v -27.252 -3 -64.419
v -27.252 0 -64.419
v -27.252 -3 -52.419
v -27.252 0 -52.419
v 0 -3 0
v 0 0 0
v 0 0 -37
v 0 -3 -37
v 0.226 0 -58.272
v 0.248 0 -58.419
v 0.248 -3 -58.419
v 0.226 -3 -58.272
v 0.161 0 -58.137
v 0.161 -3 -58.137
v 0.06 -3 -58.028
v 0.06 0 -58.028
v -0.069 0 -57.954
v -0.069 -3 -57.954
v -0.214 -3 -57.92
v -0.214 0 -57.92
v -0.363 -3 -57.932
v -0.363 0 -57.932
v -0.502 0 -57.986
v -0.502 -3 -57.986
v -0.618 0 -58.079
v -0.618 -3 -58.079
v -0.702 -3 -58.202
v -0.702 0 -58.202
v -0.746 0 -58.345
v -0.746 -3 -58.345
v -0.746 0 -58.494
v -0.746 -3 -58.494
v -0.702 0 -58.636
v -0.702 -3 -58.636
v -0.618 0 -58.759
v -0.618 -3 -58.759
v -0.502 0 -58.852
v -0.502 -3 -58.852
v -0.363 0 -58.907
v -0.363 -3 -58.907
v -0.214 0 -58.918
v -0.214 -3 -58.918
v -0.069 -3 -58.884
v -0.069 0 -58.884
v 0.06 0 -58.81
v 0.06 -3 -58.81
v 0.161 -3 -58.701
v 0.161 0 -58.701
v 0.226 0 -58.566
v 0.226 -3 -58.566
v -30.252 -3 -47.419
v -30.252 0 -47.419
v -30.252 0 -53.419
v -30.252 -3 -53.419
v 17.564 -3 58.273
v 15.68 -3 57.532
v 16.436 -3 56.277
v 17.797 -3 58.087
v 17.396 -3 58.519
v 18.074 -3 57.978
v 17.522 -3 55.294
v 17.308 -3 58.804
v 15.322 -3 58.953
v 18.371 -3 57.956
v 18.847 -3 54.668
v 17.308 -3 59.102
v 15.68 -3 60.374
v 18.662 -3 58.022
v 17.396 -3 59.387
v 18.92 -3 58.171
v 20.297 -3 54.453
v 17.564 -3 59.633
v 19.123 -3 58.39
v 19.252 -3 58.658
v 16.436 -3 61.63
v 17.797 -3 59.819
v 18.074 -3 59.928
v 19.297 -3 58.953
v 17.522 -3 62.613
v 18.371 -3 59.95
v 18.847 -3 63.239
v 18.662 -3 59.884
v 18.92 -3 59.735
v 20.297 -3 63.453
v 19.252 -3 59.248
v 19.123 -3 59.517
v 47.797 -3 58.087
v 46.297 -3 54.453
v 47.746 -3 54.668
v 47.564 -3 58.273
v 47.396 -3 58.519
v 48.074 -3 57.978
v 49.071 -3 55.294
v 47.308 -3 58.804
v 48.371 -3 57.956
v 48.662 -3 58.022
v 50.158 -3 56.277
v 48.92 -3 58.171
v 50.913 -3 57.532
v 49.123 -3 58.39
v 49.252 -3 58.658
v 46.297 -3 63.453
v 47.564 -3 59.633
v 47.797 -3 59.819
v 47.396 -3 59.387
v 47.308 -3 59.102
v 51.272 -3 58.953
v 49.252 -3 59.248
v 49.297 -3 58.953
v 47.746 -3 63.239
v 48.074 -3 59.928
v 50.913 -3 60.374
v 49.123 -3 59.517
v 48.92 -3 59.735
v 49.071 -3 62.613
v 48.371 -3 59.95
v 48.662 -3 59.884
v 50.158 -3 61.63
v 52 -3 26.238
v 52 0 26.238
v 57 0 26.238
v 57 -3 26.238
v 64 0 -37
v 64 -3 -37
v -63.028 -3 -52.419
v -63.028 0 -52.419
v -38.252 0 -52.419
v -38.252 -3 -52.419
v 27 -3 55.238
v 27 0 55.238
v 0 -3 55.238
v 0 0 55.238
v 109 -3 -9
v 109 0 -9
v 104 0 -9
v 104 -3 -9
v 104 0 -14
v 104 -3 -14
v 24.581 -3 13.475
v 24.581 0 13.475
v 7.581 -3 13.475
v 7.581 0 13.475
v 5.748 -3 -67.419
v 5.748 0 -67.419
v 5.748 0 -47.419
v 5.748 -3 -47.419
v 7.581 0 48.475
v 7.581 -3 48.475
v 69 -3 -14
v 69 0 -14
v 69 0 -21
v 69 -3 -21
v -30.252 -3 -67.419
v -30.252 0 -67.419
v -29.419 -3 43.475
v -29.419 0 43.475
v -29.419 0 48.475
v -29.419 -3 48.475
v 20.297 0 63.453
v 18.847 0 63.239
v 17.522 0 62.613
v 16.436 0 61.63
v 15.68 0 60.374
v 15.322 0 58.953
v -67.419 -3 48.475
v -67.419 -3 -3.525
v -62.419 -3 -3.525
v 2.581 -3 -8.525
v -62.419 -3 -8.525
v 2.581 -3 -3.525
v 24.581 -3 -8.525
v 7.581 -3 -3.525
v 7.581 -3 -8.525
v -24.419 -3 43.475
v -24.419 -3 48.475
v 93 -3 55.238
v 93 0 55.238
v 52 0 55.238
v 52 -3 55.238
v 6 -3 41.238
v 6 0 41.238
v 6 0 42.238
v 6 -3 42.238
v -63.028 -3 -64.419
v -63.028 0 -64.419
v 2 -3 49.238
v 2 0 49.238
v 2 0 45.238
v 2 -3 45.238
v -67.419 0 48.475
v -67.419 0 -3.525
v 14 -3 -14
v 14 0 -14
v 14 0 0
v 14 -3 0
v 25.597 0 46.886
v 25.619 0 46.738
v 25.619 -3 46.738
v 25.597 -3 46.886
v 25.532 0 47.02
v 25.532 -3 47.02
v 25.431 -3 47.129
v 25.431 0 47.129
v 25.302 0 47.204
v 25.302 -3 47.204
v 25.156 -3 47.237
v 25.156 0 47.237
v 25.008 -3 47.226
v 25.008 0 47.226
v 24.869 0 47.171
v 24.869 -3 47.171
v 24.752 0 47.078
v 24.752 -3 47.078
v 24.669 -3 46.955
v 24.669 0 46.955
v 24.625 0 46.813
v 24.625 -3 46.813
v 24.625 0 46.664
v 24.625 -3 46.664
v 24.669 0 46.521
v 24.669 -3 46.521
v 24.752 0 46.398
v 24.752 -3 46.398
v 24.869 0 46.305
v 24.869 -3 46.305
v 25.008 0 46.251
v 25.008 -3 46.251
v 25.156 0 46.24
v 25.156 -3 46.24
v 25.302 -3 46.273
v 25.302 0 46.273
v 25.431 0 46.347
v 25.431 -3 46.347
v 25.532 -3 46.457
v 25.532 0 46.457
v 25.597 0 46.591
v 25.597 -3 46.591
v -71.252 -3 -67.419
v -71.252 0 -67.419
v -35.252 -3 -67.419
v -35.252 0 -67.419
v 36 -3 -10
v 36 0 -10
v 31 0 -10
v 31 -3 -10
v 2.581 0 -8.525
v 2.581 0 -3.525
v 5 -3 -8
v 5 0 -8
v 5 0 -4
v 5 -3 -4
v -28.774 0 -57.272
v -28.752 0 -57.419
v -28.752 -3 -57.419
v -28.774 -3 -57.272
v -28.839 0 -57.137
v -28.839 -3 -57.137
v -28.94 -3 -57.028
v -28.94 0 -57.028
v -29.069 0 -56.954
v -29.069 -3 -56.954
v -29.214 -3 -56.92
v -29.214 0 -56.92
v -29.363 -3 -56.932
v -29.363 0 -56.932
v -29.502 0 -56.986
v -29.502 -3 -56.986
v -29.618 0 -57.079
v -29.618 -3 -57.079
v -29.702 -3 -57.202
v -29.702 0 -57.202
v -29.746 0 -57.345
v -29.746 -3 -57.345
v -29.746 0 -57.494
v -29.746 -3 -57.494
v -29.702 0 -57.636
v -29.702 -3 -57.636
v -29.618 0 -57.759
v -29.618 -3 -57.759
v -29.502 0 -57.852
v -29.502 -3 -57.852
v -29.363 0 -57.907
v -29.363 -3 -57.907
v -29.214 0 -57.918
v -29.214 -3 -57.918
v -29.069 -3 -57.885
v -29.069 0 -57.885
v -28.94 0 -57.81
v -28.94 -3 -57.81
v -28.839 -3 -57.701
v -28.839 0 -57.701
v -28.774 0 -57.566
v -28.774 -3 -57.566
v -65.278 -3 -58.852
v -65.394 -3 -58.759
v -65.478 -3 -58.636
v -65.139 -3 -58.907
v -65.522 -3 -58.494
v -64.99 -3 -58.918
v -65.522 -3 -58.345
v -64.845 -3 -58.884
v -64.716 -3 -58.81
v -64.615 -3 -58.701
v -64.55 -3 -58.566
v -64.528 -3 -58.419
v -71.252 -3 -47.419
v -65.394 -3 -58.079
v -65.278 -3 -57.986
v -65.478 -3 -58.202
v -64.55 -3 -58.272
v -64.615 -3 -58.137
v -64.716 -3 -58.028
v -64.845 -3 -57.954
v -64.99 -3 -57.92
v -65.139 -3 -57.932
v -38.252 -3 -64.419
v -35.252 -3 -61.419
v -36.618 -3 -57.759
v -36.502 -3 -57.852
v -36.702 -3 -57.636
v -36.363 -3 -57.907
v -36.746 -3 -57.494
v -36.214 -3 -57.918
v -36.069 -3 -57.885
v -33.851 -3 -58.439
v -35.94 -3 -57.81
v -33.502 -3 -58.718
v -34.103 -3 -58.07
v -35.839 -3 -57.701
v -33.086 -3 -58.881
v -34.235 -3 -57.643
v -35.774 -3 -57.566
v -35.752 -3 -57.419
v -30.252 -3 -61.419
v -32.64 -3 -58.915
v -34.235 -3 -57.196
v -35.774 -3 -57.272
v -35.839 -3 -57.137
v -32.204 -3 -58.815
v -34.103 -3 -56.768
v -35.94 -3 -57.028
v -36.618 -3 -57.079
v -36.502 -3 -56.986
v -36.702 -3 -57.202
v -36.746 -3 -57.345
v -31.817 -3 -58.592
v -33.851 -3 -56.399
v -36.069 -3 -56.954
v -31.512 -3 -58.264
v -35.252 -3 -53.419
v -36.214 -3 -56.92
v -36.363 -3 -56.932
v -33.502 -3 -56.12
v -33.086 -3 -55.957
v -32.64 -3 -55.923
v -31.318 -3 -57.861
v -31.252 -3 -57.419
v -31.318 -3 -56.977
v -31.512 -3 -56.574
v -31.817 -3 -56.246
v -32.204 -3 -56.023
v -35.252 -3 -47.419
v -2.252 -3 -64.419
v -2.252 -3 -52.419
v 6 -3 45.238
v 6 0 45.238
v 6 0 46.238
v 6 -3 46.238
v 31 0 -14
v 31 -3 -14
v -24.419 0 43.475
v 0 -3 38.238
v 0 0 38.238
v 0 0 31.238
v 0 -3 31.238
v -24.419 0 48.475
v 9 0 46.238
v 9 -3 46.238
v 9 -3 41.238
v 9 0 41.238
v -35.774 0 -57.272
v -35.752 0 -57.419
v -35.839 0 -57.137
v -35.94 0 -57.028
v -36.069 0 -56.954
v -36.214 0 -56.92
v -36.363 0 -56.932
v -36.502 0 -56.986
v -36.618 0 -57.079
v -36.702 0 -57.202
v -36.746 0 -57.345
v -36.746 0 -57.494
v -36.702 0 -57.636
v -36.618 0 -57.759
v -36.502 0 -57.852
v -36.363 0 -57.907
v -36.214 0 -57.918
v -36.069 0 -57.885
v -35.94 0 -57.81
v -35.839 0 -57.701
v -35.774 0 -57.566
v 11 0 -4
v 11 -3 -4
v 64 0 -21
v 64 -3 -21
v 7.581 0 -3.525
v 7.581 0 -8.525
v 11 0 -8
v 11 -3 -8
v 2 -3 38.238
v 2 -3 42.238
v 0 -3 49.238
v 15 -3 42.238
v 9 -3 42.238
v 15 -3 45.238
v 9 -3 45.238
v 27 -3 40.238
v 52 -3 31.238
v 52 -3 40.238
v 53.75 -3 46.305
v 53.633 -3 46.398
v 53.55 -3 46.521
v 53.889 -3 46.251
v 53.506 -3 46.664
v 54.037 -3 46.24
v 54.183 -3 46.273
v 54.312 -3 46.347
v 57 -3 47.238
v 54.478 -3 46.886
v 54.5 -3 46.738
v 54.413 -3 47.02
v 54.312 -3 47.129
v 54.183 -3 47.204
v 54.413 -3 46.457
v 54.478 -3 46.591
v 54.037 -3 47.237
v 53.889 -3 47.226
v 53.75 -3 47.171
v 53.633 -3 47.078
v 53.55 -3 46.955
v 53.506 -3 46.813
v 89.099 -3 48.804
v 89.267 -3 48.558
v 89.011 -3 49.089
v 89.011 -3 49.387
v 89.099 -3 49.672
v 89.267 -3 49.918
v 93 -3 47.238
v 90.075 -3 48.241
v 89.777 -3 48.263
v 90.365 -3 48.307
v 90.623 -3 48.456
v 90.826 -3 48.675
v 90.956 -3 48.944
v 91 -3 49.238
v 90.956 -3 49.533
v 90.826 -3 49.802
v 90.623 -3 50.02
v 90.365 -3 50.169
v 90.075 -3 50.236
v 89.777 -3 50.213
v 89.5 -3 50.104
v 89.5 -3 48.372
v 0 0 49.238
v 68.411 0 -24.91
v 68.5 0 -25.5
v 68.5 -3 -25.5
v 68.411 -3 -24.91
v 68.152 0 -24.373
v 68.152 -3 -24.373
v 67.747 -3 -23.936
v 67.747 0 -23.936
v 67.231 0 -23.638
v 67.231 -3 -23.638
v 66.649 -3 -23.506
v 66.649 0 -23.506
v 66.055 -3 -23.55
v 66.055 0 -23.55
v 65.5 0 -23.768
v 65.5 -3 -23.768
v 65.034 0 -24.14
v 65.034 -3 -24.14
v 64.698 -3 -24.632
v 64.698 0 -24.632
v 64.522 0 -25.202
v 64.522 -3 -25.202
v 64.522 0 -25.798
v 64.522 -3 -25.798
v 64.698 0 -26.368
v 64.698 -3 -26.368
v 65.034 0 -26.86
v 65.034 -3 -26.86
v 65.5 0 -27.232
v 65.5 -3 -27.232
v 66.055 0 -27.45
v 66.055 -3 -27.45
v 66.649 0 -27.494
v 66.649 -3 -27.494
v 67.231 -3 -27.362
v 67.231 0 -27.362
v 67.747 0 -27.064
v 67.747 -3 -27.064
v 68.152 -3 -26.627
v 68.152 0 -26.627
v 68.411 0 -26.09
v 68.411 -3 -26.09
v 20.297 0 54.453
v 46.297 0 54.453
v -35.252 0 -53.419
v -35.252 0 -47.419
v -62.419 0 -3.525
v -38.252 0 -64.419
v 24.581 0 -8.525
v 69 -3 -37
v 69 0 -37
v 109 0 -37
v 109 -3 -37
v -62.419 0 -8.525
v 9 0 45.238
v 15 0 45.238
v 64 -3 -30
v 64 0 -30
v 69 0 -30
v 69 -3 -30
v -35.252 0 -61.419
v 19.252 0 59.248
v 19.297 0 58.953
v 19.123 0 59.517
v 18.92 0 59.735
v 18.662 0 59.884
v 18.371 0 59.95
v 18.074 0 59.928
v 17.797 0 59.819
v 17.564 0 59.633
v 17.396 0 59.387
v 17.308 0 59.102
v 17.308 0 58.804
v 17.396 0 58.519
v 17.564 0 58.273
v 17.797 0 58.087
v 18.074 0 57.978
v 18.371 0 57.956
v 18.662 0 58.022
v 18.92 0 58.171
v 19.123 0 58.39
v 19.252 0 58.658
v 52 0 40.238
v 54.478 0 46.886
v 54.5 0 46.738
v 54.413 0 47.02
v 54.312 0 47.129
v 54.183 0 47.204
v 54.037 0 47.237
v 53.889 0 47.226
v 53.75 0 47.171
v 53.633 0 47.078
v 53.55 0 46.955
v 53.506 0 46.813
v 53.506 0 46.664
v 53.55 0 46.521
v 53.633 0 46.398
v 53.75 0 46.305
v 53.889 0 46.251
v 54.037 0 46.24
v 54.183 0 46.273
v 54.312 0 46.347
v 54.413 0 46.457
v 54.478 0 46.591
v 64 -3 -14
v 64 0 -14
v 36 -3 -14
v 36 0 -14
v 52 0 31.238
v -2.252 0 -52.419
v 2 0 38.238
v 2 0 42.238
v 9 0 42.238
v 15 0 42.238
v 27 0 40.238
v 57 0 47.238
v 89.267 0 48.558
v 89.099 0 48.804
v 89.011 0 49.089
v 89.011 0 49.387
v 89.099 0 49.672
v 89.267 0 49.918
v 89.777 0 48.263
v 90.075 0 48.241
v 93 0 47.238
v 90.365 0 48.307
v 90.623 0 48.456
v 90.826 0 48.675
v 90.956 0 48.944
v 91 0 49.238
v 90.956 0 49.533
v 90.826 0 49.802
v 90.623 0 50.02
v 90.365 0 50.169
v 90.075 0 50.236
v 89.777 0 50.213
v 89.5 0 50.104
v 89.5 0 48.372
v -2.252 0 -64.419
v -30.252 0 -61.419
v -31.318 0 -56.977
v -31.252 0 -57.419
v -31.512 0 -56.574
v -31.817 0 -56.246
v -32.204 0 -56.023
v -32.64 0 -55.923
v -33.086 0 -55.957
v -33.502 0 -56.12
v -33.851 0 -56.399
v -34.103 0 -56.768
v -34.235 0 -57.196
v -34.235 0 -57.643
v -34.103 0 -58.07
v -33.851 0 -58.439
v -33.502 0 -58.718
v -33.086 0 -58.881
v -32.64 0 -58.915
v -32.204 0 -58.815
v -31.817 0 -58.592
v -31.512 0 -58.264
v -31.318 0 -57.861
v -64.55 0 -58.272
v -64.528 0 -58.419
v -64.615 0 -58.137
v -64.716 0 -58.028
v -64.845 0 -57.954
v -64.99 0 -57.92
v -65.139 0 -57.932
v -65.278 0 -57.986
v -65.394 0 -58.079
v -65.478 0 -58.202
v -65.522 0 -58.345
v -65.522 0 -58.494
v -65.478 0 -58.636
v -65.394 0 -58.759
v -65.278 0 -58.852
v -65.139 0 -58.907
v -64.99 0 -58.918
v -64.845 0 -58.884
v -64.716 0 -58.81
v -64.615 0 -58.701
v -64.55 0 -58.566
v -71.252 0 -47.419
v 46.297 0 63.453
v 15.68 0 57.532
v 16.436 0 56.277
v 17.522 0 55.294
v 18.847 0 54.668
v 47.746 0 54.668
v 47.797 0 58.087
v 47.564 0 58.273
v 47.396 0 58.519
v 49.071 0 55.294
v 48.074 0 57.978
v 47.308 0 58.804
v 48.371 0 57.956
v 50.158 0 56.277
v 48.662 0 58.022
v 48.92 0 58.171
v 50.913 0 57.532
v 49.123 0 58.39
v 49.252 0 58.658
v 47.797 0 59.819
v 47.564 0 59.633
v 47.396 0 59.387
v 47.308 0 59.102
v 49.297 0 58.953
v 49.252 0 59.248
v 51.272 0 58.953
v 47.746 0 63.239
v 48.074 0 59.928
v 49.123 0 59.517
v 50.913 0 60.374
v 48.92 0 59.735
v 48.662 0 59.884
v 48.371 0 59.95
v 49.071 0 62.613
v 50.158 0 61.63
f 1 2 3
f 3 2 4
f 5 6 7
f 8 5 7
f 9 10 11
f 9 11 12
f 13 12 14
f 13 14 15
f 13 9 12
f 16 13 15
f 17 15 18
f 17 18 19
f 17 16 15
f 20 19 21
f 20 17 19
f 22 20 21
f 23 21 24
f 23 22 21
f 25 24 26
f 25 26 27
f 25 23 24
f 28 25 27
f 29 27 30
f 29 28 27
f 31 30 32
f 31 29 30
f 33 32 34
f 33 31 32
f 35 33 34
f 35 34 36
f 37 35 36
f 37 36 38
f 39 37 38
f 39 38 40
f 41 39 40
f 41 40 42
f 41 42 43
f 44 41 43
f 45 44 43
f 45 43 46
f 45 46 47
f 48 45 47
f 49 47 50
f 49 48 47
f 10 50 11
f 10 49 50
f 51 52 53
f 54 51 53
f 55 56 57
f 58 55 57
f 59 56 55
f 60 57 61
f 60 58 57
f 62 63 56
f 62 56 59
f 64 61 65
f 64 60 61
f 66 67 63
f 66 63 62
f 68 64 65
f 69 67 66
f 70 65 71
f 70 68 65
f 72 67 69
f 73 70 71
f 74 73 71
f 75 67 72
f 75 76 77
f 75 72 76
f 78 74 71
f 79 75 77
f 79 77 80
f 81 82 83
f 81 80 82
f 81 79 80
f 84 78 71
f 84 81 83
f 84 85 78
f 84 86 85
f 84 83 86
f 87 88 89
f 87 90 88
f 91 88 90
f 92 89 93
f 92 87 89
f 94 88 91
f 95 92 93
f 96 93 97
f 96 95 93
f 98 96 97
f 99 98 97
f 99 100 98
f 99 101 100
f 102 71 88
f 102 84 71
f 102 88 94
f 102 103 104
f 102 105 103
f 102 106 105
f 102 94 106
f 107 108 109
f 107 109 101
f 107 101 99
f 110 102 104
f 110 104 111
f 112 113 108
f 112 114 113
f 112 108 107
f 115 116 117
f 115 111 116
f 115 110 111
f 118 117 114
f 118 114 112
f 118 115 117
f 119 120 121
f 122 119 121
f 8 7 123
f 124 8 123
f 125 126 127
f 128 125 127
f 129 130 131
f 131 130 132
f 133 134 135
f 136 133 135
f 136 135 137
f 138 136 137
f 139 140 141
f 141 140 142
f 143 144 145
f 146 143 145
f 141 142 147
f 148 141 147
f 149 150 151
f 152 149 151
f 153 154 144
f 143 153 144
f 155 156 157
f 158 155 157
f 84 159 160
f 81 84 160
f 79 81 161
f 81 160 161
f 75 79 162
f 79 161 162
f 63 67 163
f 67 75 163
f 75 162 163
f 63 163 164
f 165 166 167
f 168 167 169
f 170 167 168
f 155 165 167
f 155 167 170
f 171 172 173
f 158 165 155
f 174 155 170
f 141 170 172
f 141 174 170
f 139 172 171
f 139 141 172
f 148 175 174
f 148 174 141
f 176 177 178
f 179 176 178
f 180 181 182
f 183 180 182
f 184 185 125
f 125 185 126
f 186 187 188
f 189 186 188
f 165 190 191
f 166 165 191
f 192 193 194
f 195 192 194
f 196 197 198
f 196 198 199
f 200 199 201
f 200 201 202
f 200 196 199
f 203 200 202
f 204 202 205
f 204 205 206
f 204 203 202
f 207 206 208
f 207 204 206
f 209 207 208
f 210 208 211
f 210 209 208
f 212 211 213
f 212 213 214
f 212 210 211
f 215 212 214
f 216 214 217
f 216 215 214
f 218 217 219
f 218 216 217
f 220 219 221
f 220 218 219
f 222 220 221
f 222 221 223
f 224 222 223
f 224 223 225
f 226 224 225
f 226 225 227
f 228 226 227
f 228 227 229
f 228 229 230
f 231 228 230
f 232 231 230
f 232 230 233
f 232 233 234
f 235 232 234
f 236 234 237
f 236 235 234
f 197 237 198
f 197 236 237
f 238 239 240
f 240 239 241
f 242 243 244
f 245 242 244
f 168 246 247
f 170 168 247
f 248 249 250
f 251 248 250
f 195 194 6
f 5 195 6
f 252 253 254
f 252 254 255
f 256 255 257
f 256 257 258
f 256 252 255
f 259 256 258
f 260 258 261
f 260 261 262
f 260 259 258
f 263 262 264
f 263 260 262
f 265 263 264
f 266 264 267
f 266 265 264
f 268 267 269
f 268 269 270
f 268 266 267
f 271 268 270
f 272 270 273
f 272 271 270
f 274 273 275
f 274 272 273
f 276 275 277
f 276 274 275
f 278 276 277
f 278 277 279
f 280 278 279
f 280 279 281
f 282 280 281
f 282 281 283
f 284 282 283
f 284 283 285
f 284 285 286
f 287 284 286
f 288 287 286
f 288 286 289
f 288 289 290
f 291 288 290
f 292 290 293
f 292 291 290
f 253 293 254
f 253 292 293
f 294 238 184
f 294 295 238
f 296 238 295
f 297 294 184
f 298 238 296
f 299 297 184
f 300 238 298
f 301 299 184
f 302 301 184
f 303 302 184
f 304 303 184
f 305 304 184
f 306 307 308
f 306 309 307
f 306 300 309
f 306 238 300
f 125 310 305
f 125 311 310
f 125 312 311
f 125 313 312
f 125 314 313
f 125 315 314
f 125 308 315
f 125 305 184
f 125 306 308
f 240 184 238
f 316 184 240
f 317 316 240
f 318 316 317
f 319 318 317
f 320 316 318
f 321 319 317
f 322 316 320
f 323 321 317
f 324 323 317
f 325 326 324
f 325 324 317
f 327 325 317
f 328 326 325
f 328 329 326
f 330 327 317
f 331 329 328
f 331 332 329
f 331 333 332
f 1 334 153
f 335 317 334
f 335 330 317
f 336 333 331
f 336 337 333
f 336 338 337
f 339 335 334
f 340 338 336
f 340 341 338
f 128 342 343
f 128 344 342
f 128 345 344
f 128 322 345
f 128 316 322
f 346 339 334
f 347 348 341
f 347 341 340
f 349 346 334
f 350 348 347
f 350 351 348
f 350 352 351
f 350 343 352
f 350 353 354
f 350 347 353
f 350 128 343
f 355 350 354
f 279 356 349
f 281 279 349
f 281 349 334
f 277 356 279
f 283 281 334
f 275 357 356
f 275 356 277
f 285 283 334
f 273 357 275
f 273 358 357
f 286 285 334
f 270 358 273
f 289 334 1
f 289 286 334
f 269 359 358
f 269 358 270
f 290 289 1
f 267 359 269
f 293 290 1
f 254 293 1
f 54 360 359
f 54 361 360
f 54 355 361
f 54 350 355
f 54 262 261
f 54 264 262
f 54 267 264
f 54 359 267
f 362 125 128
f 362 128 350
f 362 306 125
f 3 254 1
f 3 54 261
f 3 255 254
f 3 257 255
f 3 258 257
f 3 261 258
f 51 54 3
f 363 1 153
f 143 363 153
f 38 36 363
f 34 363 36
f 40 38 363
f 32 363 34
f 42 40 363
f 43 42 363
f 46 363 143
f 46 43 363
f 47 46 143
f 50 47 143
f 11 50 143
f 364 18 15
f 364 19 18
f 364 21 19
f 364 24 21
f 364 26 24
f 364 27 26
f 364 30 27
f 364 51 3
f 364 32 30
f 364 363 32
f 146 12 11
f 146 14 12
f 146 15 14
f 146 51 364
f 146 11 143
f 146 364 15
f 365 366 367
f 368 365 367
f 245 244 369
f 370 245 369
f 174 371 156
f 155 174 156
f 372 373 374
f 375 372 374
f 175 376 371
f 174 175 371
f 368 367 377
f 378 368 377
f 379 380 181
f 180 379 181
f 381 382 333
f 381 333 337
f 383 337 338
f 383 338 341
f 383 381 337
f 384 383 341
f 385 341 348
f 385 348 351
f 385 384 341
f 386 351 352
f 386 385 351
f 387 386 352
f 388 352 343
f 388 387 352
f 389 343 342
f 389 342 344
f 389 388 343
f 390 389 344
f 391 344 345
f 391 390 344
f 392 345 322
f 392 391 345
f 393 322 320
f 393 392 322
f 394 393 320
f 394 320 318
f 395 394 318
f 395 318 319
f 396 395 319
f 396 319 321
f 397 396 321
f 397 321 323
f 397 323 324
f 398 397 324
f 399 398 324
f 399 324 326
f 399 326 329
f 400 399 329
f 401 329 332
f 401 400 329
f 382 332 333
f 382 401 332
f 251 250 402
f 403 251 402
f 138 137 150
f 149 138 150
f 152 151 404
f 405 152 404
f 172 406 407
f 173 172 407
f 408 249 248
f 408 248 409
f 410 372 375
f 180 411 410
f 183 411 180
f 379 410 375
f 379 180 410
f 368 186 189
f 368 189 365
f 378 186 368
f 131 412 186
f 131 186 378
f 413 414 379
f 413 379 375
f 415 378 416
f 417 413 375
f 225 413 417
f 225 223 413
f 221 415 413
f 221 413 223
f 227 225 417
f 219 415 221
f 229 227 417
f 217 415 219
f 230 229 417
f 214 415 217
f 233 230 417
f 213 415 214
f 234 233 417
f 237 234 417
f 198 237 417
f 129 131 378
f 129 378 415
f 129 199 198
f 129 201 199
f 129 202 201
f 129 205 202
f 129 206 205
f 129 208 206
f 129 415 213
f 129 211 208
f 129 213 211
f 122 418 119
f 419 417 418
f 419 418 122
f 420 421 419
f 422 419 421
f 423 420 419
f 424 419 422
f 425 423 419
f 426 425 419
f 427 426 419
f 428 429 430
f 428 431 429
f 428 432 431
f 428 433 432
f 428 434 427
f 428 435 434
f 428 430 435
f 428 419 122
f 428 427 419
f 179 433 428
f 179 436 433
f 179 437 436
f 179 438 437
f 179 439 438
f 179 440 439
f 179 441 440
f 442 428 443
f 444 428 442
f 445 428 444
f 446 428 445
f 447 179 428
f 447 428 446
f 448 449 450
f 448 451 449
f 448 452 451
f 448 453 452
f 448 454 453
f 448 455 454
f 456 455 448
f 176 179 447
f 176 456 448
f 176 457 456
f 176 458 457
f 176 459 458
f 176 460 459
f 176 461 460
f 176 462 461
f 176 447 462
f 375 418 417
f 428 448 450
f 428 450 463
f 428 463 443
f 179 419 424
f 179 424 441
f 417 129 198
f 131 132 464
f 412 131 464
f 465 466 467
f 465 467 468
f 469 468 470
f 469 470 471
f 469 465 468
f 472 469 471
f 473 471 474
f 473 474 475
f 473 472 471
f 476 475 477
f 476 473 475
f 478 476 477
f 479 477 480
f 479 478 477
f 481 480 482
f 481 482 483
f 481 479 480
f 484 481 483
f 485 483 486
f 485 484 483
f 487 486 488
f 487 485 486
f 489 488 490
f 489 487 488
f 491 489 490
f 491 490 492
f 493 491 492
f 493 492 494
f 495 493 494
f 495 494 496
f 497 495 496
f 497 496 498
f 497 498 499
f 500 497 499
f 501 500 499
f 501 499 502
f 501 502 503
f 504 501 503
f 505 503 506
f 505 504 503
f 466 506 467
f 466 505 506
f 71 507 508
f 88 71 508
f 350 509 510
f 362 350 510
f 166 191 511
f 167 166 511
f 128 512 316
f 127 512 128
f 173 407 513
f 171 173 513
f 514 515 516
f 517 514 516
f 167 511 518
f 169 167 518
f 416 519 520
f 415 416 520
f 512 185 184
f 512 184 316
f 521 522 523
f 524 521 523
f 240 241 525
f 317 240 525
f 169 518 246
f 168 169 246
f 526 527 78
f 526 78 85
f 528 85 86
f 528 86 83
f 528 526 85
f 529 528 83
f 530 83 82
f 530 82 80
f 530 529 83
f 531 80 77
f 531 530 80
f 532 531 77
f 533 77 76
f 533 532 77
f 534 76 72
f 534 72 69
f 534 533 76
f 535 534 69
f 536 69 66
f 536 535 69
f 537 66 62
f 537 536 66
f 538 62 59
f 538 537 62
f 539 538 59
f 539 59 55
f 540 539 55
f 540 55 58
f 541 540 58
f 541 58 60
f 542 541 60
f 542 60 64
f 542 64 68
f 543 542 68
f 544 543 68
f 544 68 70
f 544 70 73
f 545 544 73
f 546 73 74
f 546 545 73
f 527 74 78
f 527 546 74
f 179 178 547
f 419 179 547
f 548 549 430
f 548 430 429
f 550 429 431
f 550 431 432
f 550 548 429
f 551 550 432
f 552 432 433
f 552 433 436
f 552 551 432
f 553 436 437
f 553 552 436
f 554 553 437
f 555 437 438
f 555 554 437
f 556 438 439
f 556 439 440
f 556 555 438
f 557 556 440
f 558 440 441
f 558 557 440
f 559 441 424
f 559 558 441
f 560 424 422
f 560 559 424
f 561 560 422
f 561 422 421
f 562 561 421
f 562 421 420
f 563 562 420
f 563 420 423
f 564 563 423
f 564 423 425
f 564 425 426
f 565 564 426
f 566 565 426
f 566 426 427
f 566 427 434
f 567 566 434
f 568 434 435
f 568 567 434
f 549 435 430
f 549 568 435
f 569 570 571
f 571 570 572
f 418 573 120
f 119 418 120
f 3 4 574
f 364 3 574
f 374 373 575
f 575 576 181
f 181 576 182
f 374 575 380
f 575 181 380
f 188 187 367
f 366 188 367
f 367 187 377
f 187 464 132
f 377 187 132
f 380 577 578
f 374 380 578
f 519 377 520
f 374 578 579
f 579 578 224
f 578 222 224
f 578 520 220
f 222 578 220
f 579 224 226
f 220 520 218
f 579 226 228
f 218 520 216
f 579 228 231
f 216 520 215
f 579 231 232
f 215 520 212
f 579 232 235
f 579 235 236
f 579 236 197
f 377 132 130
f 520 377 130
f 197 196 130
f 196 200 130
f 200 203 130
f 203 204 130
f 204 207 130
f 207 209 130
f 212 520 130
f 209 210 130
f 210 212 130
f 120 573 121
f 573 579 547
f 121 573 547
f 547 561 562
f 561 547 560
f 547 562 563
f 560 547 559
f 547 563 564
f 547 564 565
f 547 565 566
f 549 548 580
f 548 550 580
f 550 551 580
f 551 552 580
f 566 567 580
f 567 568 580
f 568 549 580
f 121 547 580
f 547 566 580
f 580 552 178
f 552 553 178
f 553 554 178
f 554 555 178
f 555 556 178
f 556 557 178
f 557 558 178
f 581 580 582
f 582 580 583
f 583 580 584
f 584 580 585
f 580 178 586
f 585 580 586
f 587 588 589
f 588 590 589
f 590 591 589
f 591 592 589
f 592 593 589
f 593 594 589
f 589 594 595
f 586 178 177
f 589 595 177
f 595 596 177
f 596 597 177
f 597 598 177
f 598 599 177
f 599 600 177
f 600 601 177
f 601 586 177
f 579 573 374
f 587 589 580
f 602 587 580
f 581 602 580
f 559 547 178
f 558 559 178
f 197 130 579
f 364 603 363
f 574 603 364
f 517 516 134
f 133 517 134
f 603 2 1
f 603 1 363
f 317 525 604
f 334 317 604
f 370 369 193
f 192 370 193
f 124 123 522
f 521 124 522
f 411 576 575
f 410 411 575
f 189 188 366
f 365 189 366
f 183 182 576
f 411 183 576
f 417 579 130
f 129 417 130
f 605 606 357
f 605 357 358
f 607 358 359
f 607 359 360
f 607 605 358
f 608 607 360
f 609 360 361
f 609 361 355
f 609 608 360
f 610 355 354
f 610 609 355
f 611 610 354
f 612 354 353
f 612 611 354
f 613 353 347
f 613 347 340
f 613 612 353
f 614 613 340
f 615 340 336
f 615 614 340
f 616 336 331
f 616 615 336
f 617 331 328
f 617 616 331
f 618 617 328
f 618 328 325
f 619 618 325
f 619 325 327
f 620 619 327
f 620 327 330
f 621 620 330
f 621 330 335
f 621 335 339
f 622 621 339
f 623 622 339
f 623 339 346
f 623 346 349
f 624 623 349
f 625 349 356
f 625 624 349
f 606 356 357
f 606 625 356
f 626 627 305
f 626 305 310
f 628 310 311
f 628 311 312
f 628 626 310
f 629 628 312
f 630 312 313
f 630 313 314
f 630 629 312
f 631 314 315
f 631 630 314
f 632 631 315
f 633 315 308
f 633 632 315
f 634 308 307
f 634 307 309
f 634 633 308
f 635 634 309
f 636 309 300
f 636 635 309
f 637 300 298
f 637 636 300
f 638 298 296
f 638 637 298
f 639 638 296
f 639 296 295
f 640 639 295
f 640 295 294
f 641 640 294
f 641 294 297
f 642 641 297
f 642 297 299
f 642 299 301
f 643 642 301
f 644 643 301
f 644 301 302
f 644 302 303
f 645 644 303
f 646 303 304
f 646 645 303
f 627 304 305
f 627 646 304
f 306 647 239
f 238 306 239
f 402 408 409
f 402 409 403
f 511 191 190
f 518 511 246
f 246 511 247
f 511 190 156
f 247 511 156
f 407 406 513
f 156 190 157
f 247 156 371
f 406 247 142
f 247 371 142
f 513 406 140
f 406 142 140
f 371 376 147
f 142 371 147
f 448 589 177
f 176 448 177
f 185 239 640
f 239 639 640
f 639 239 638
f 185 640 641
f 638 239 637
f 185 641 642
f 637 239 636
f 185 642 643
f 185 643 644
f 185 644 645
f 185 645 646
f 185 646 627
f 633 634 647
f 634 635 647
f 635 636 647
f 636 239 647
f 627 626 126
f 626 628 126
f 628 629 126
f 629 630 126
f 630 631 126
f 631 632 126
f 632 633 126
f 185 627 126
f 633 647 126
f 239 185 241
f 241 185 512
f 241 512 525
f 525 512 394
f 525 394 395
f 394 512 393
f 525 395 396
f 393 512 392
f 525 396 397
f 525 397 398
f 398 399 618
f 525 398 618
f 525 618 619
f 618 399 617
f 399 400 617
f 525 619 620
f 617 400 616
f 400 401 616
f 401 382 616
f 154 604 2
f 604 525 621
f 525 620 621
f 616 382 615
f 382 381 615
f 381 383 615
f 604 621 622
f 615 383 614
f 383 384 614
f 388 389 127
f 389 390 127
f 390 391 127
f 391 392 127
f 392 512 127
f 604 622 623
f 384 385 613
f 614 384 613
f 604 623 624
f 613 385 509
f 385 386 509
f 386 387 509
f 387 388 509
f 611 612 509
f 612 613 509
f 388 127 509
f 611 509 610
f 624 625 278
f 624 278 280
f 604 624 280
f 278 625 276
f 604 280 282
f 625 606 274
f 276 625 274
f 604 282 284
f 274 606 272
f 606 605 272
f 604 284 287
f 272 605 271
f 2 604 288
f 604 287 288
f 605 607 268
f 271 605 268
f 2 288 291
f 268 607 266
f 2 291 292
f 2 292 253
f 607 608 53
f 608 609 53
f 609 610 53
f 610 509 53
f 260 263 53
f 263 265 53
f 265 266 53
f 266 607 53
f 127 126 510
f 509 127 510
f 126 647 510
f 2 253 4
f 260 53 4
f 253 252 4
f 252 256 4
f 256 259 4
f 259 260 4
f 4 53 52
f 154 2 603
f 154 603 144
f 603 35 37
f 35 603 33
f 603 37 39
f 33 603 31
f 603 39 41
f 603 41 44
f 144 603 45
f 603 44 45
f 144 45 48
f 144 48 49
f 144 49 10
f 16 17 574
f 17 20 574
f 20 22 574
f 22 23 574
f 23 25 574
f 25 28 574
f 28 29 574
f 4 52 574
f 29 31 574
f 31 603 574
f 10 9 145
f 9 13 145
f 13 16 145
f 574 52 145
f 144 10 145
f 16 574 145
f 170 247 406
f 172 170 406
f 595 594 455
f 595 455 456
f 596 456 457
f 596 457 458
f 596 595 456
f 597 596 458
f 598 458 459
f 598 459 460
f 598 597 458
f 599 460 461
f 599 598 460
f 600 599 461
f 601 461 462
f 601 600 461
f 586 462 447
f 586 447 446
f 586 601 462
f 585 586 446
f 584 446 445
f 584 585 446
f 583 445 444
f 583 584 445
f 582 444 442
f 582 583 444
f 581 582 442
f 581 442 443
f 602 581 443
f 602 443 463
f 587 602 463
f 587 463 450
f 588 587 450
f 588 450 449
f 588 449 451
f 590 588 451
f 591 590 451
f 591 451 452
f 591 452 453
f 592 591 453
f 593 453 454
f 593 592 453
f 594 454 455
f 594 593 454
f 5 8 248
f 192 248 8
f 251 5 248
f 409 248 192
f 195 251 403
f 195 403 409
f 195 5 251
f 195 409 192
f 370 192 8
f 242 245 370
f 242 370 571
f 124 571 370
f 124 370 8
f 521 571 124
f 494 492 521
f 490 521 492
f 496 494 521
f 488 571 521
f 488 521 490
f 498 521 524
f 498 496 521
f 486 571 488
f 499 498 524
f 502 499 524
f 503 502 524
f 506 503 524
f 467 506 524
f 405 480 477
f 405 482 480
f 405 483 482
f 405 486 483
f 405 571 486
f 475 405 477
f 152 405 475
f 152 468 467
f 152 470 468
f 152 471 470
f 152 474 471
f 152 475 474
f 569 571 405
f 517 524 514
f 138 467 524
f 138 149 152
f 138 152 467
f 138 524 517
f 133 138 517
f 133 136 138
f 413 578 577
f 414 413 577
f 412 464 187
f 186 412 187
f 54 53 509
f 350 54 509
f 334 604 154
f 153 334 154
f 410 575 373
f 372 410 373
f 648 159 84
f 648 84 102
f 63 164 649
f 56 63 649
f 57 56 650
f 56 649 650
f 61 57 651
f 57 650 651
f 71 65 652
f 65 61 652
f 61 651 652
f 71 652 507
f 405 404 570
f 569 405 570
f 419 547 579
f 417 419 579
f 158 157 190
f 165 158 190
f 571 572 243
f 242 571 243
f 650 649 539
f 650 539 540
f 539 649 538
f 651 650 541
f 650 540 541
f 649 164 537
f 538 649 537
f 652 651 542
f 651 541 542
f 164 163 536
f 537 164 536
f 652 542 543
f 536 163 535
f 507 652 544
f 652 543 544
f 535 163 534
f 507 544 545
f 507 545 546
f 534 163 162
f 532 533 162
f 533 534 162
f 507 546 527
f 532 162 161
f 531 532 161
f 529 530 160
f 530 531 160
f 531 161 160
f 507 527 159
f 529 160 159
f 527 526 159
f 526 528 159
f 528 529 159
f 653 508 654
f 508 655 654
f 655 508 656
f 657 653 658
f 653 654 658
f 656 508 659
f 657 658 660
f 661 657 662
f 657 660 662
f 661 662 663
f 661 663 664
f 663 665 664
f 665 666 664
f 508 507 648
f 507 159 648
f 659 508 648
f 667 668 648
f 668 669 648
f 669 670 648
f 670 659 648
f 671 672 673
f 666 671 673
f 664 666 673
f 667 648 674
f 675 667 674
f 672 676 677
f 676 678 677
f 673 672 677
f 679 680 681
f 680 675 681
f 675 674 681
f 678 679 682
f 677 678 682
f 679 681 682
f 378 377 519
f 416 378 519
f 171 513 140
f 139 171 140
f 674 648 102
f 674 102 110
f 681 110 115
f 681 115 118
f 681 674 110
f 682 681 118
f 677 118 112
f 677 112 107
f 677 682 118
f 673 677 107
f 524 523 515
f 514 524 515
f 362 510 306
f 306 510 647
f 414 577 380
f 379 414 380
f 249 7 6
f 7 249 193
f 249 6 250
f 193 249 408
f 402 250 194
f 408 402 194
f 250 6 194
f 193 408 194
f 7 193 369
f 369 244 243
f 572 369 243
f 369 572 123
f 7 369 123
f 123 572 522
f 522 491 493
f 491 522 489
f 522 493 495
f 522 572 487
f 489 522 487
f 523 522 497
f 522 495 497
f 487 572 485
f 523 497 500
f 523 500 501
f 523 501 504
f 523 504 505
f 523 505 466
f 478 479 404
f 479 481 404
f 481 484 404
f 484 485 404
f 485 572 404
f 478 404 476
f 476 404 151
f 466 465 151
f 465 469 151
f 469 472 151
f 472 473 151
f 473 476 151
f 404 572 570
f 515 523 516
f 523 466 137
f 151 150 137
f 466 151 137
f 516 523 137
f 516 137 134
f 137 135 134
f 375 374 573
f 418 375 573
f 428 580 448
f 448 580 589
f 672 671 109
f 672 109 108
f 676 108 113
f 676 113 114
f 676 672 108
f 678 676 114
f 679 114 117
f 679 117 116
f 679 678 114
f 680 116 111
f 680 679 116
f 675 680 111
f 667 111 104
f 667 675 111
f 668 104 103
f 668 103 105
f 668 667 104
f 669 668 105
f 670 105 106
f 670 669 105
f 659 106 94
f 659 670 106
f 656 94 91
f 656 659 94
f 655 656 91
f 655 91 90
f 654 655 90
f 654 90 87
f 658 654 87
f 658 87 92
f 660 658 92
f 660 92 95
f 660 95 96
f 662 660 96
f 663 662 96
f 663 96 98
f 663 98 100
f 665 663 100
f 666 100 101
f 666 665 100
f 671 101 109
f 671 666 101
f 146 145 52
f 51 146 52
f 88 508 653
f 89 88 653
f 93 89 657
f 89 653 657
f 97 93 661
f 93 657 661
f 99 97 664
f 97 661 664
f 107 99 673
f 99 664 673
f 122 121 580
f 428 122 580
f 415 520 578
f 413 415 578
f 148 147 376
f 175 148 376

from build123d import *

# Parameters (mm, degrees)
F1_DEPTH    = 3
F2_R        = 2
F2_W        = 6
F2_H        = 4
F3_DEPTH    = 3
F4_R        = 0.5
F4_W        = 24.7760626674
F4_H        = 12
F4_R_2      = 1.5
F4_W_2      = 25
F5_DEPTH    = 3
F6_W        = 36
F6_H        = 9
F6_R        = 1
F7_DEPTH    = 3
F8_T1_DEPTH = 28
F9_R        = 0.5
F9_R_2      = 1
F10_DEPTH   = 3


# Not quite as in the source:
# - a fillet or chamfer that OpenCascade refuses, or shapes differently, is made with other operations: its cross-section is extruded or revolved along the edge and cut away or added


with BuildPart() as f1:
    # F0 (on Front) → F1 (new body)
    with BuildSketch(Plane.XZ):
        Polygon((-29.4190670252, 48.4748313129), (-67.4190670252, 48.4748313129), (-67.4190670252, -3.5251686871), (-62.4190670252, -3.5251686871), (-62.4190670252, -8.5251686871), (2.5809329748, -8.5251686871), (2.5809329748, -3.5251686871), (7.5809329748, -3.5251686871), (7.5809329748, -8.5251686871), (24.5809329748, -8.5251686871), (24.5809329748, 13.4748313129), (7.5809329748, 13.4748313129), (7.5809329748, 48.4748313129), (-24.4190670252, 48.4748313129), (-24.4190670252, 43.4748313129), (-29.4190670252, 43.4748313129), align=None)
    extrude(amount=F1_DEPTH)


with BuildPart() as f3:
    # F2 (on Front) → F3 (new body)
    with BuildSketch(Plane.XZ):
        Polygon((14, 0), (0, 0), (0, -37), (64, -37), (64, -30), (69, -30), (69, -37), (109, -37), (109, -9), (104, -9), (104, -14), (69, -14), (69, -21), (64, -21), (64, -14), (36, -14), (36, -10), (31, -10), (31, -14), (14, -14), align=None)
        with Locations((66.5, -25.5)):
            Circle(F2_R, mode=Mode.SUBTRACT)
        with Locations((8, -6)):
            Rectangle(F2_W, F2_H, mode=Mode.SUBTRACT)
    extrude(amount=F3_DEPTH)


with BuildPart() as f5:
    # F4 (on Front) → F5 (new body)
    with BuildSketch(Plane.XZ):
        Polygon((-71.2518001199, -47.4190670252), (-71.2518001199, -67.4190670252), (-35.2518001199, -67.4190670252), (-35.2518001199, -61.4190670252), (-30.2518001199, -61.4190670252), (-30.2518001199, -67.4190670252), (5.7481998801, -67.4190670252), (5.7481998801, -47.4190670252), (-30.2518001199, -47.4190670252), (-30.2518001199, -53.4190670252), (-35.2518001199, -53.4190670252), (-35.2518001199, -47.4190670252), align=None)
        with Locations((-65.0278627872, -58.4190629094)):
            Circle(F4_R, mode=Mode.SUBTRACT)
        with Locations((-50.6398314536, -58.4190629094)):
            Rectangle(F4_W, F4_H, mode=Mode.SUBTRACT)
        with Locations((-36.2518001199, -57.4190670252)):
            Circle(F4_R, mode=Mode.SUBTRACT)
        with Locations((-32.7518001199, -57.4190670252)):
            Circle(F4_R_2, mode=Mode.SUBTRACT)
        with Locations((-29.2518001199, -57.4190670252)):
            Circle(F4_R, mode=Mode.SUBTRACT)
        with Locations((-14.7518001199, -58.4190629094)):
            Rectangle(F4_W_2, F4_H, mode=Mode.SUBTRACT)
        with Locations((-0.2518001199, -58.4190629094)):
            Circle(F4_R, mode=Mode.SUBTRACT)
    extrude(amount=F5_DEPTH)


with BuildPart() as f7:
    # F6 (on Front) → F7 (new body)
    with BuildSketch(Plane.XZ):
        with Locations((33.2967646718, 58.9532347322)):
            Rectangle(F6_W, F6_H)
        with Locations((18.2967646718, 58.9532347322)):
            Circle(F6_R, mode=Mode.SUBTRACT)
        with Locations((48.2967646718, 58.9532347322)):
            Circle(F6_R, mode=Mode.SUBTRACT)
    extrude(amount=F7_DEPTH)

    # F8: fillet of radius 5 on 4 edges, made by hand

    # F8_s2 → F8_t1 (cut)
    with BuildSketch(Plane.XZ.offset(-12.5)):
        with BuildLine():
            ThreePointArc((20.2967646718, 63.4532347322), (16.7612307659, 61.9887686381), (15.2967646718, 58.4532347322))
            Line((15.2967646718, 58.4532347322), (15.2967646718, 63.4532347322))
            Line((15.2967646718, 63.4532347322), (20.2967646718, 63.4532347322))
        make_face()
        with BuildLine():
            ThreePointArc((15.2967646718, 59.4532347322), (16.7612307659, 55.9177008262), (20.2967646718, 54.4532347322))
            Line((20.2967646718, 54.4532347322), (15.2967646718, 54.4532347322))
            Line((15.2967646718, 54.4532347322), (15.2967646718, 59.4532347322))
        make_face()
        with BuildLine():
            ThreePointArc((46.2967646718, 63.4532347322), (49.8322985777, 61.9887686381), (51.2967646718, 58.4532347322))
            Line((51.2967646718, 58.4532347322), (51.2967646718, 63.4532347322))
            Line((51.2967646718, 63.4532347322), (46.2967646718, 63.4532347322))
        make_face()
        with BuildLine():
            ThreePointArc((46.2967646718, 54.4532347322), (49.8322985777, 55.9177008262), (51.2967646718, 59.4532347322))
            Line((51.2967646718, 59.4532347322), (51.2967646718, 54.4532347322))
            Line((51.2967646718, 54.4532347322), (46.2967646718, 54.4532347322))
        make_face()
    extrude(amount=F8_T1_DEPTH, mode=Mode.SUBTRACT)


with BuildPart() as f10:
    # F9 (on Front) → F10 (new body)
    with BuildSketch(Plane.XZ):
        Polygon((27, 55.2383102477), (0, 55.2383102477), (0, 49.2383102477), (2, 49.2383102477), (2, 45.2383102477), (6, 45.2383102477), (6, 46.2383102477), (9, 46.2383102477), (9, 45.2383102477), (15, 45.2383102477), (15, 42.2383102477), (9, 42.2383102477), (9, 41.2383102477), (6, 41.2383102477), (6, 42.2383102477), (2, 42.2383102477), (2, 38.2383102477), (0, 38.2383102477), (0, 31.2383102477), (52, 31.2383102477), (52, 26.2383102477), (57, 26.2383102477), (57, 47.2383102477), (93, 47.2383102477), (93, 55.2383102477), (52, 55.2383102477), (52, 40.2383102477), (27, 40.2383102477), align=None)
        with Locations((25.1189991832, 46.7383102477)):
            Circle(F9_R, mode=Mode.SUBTRACT)
        with Locations((53.9999991832, 46.7383102477)):
            Circle(F9_R, mode=Mode.SUBTRACT)
        with Locations((90, 49.2383102477)):
            Circle(F9_R_2, mode=Mode.SUBTRACT)
    extrude(amount=F10_DEPTH)


solid = Compound([f1.part, f3.part, f5.part, f7.part, f10.part])
